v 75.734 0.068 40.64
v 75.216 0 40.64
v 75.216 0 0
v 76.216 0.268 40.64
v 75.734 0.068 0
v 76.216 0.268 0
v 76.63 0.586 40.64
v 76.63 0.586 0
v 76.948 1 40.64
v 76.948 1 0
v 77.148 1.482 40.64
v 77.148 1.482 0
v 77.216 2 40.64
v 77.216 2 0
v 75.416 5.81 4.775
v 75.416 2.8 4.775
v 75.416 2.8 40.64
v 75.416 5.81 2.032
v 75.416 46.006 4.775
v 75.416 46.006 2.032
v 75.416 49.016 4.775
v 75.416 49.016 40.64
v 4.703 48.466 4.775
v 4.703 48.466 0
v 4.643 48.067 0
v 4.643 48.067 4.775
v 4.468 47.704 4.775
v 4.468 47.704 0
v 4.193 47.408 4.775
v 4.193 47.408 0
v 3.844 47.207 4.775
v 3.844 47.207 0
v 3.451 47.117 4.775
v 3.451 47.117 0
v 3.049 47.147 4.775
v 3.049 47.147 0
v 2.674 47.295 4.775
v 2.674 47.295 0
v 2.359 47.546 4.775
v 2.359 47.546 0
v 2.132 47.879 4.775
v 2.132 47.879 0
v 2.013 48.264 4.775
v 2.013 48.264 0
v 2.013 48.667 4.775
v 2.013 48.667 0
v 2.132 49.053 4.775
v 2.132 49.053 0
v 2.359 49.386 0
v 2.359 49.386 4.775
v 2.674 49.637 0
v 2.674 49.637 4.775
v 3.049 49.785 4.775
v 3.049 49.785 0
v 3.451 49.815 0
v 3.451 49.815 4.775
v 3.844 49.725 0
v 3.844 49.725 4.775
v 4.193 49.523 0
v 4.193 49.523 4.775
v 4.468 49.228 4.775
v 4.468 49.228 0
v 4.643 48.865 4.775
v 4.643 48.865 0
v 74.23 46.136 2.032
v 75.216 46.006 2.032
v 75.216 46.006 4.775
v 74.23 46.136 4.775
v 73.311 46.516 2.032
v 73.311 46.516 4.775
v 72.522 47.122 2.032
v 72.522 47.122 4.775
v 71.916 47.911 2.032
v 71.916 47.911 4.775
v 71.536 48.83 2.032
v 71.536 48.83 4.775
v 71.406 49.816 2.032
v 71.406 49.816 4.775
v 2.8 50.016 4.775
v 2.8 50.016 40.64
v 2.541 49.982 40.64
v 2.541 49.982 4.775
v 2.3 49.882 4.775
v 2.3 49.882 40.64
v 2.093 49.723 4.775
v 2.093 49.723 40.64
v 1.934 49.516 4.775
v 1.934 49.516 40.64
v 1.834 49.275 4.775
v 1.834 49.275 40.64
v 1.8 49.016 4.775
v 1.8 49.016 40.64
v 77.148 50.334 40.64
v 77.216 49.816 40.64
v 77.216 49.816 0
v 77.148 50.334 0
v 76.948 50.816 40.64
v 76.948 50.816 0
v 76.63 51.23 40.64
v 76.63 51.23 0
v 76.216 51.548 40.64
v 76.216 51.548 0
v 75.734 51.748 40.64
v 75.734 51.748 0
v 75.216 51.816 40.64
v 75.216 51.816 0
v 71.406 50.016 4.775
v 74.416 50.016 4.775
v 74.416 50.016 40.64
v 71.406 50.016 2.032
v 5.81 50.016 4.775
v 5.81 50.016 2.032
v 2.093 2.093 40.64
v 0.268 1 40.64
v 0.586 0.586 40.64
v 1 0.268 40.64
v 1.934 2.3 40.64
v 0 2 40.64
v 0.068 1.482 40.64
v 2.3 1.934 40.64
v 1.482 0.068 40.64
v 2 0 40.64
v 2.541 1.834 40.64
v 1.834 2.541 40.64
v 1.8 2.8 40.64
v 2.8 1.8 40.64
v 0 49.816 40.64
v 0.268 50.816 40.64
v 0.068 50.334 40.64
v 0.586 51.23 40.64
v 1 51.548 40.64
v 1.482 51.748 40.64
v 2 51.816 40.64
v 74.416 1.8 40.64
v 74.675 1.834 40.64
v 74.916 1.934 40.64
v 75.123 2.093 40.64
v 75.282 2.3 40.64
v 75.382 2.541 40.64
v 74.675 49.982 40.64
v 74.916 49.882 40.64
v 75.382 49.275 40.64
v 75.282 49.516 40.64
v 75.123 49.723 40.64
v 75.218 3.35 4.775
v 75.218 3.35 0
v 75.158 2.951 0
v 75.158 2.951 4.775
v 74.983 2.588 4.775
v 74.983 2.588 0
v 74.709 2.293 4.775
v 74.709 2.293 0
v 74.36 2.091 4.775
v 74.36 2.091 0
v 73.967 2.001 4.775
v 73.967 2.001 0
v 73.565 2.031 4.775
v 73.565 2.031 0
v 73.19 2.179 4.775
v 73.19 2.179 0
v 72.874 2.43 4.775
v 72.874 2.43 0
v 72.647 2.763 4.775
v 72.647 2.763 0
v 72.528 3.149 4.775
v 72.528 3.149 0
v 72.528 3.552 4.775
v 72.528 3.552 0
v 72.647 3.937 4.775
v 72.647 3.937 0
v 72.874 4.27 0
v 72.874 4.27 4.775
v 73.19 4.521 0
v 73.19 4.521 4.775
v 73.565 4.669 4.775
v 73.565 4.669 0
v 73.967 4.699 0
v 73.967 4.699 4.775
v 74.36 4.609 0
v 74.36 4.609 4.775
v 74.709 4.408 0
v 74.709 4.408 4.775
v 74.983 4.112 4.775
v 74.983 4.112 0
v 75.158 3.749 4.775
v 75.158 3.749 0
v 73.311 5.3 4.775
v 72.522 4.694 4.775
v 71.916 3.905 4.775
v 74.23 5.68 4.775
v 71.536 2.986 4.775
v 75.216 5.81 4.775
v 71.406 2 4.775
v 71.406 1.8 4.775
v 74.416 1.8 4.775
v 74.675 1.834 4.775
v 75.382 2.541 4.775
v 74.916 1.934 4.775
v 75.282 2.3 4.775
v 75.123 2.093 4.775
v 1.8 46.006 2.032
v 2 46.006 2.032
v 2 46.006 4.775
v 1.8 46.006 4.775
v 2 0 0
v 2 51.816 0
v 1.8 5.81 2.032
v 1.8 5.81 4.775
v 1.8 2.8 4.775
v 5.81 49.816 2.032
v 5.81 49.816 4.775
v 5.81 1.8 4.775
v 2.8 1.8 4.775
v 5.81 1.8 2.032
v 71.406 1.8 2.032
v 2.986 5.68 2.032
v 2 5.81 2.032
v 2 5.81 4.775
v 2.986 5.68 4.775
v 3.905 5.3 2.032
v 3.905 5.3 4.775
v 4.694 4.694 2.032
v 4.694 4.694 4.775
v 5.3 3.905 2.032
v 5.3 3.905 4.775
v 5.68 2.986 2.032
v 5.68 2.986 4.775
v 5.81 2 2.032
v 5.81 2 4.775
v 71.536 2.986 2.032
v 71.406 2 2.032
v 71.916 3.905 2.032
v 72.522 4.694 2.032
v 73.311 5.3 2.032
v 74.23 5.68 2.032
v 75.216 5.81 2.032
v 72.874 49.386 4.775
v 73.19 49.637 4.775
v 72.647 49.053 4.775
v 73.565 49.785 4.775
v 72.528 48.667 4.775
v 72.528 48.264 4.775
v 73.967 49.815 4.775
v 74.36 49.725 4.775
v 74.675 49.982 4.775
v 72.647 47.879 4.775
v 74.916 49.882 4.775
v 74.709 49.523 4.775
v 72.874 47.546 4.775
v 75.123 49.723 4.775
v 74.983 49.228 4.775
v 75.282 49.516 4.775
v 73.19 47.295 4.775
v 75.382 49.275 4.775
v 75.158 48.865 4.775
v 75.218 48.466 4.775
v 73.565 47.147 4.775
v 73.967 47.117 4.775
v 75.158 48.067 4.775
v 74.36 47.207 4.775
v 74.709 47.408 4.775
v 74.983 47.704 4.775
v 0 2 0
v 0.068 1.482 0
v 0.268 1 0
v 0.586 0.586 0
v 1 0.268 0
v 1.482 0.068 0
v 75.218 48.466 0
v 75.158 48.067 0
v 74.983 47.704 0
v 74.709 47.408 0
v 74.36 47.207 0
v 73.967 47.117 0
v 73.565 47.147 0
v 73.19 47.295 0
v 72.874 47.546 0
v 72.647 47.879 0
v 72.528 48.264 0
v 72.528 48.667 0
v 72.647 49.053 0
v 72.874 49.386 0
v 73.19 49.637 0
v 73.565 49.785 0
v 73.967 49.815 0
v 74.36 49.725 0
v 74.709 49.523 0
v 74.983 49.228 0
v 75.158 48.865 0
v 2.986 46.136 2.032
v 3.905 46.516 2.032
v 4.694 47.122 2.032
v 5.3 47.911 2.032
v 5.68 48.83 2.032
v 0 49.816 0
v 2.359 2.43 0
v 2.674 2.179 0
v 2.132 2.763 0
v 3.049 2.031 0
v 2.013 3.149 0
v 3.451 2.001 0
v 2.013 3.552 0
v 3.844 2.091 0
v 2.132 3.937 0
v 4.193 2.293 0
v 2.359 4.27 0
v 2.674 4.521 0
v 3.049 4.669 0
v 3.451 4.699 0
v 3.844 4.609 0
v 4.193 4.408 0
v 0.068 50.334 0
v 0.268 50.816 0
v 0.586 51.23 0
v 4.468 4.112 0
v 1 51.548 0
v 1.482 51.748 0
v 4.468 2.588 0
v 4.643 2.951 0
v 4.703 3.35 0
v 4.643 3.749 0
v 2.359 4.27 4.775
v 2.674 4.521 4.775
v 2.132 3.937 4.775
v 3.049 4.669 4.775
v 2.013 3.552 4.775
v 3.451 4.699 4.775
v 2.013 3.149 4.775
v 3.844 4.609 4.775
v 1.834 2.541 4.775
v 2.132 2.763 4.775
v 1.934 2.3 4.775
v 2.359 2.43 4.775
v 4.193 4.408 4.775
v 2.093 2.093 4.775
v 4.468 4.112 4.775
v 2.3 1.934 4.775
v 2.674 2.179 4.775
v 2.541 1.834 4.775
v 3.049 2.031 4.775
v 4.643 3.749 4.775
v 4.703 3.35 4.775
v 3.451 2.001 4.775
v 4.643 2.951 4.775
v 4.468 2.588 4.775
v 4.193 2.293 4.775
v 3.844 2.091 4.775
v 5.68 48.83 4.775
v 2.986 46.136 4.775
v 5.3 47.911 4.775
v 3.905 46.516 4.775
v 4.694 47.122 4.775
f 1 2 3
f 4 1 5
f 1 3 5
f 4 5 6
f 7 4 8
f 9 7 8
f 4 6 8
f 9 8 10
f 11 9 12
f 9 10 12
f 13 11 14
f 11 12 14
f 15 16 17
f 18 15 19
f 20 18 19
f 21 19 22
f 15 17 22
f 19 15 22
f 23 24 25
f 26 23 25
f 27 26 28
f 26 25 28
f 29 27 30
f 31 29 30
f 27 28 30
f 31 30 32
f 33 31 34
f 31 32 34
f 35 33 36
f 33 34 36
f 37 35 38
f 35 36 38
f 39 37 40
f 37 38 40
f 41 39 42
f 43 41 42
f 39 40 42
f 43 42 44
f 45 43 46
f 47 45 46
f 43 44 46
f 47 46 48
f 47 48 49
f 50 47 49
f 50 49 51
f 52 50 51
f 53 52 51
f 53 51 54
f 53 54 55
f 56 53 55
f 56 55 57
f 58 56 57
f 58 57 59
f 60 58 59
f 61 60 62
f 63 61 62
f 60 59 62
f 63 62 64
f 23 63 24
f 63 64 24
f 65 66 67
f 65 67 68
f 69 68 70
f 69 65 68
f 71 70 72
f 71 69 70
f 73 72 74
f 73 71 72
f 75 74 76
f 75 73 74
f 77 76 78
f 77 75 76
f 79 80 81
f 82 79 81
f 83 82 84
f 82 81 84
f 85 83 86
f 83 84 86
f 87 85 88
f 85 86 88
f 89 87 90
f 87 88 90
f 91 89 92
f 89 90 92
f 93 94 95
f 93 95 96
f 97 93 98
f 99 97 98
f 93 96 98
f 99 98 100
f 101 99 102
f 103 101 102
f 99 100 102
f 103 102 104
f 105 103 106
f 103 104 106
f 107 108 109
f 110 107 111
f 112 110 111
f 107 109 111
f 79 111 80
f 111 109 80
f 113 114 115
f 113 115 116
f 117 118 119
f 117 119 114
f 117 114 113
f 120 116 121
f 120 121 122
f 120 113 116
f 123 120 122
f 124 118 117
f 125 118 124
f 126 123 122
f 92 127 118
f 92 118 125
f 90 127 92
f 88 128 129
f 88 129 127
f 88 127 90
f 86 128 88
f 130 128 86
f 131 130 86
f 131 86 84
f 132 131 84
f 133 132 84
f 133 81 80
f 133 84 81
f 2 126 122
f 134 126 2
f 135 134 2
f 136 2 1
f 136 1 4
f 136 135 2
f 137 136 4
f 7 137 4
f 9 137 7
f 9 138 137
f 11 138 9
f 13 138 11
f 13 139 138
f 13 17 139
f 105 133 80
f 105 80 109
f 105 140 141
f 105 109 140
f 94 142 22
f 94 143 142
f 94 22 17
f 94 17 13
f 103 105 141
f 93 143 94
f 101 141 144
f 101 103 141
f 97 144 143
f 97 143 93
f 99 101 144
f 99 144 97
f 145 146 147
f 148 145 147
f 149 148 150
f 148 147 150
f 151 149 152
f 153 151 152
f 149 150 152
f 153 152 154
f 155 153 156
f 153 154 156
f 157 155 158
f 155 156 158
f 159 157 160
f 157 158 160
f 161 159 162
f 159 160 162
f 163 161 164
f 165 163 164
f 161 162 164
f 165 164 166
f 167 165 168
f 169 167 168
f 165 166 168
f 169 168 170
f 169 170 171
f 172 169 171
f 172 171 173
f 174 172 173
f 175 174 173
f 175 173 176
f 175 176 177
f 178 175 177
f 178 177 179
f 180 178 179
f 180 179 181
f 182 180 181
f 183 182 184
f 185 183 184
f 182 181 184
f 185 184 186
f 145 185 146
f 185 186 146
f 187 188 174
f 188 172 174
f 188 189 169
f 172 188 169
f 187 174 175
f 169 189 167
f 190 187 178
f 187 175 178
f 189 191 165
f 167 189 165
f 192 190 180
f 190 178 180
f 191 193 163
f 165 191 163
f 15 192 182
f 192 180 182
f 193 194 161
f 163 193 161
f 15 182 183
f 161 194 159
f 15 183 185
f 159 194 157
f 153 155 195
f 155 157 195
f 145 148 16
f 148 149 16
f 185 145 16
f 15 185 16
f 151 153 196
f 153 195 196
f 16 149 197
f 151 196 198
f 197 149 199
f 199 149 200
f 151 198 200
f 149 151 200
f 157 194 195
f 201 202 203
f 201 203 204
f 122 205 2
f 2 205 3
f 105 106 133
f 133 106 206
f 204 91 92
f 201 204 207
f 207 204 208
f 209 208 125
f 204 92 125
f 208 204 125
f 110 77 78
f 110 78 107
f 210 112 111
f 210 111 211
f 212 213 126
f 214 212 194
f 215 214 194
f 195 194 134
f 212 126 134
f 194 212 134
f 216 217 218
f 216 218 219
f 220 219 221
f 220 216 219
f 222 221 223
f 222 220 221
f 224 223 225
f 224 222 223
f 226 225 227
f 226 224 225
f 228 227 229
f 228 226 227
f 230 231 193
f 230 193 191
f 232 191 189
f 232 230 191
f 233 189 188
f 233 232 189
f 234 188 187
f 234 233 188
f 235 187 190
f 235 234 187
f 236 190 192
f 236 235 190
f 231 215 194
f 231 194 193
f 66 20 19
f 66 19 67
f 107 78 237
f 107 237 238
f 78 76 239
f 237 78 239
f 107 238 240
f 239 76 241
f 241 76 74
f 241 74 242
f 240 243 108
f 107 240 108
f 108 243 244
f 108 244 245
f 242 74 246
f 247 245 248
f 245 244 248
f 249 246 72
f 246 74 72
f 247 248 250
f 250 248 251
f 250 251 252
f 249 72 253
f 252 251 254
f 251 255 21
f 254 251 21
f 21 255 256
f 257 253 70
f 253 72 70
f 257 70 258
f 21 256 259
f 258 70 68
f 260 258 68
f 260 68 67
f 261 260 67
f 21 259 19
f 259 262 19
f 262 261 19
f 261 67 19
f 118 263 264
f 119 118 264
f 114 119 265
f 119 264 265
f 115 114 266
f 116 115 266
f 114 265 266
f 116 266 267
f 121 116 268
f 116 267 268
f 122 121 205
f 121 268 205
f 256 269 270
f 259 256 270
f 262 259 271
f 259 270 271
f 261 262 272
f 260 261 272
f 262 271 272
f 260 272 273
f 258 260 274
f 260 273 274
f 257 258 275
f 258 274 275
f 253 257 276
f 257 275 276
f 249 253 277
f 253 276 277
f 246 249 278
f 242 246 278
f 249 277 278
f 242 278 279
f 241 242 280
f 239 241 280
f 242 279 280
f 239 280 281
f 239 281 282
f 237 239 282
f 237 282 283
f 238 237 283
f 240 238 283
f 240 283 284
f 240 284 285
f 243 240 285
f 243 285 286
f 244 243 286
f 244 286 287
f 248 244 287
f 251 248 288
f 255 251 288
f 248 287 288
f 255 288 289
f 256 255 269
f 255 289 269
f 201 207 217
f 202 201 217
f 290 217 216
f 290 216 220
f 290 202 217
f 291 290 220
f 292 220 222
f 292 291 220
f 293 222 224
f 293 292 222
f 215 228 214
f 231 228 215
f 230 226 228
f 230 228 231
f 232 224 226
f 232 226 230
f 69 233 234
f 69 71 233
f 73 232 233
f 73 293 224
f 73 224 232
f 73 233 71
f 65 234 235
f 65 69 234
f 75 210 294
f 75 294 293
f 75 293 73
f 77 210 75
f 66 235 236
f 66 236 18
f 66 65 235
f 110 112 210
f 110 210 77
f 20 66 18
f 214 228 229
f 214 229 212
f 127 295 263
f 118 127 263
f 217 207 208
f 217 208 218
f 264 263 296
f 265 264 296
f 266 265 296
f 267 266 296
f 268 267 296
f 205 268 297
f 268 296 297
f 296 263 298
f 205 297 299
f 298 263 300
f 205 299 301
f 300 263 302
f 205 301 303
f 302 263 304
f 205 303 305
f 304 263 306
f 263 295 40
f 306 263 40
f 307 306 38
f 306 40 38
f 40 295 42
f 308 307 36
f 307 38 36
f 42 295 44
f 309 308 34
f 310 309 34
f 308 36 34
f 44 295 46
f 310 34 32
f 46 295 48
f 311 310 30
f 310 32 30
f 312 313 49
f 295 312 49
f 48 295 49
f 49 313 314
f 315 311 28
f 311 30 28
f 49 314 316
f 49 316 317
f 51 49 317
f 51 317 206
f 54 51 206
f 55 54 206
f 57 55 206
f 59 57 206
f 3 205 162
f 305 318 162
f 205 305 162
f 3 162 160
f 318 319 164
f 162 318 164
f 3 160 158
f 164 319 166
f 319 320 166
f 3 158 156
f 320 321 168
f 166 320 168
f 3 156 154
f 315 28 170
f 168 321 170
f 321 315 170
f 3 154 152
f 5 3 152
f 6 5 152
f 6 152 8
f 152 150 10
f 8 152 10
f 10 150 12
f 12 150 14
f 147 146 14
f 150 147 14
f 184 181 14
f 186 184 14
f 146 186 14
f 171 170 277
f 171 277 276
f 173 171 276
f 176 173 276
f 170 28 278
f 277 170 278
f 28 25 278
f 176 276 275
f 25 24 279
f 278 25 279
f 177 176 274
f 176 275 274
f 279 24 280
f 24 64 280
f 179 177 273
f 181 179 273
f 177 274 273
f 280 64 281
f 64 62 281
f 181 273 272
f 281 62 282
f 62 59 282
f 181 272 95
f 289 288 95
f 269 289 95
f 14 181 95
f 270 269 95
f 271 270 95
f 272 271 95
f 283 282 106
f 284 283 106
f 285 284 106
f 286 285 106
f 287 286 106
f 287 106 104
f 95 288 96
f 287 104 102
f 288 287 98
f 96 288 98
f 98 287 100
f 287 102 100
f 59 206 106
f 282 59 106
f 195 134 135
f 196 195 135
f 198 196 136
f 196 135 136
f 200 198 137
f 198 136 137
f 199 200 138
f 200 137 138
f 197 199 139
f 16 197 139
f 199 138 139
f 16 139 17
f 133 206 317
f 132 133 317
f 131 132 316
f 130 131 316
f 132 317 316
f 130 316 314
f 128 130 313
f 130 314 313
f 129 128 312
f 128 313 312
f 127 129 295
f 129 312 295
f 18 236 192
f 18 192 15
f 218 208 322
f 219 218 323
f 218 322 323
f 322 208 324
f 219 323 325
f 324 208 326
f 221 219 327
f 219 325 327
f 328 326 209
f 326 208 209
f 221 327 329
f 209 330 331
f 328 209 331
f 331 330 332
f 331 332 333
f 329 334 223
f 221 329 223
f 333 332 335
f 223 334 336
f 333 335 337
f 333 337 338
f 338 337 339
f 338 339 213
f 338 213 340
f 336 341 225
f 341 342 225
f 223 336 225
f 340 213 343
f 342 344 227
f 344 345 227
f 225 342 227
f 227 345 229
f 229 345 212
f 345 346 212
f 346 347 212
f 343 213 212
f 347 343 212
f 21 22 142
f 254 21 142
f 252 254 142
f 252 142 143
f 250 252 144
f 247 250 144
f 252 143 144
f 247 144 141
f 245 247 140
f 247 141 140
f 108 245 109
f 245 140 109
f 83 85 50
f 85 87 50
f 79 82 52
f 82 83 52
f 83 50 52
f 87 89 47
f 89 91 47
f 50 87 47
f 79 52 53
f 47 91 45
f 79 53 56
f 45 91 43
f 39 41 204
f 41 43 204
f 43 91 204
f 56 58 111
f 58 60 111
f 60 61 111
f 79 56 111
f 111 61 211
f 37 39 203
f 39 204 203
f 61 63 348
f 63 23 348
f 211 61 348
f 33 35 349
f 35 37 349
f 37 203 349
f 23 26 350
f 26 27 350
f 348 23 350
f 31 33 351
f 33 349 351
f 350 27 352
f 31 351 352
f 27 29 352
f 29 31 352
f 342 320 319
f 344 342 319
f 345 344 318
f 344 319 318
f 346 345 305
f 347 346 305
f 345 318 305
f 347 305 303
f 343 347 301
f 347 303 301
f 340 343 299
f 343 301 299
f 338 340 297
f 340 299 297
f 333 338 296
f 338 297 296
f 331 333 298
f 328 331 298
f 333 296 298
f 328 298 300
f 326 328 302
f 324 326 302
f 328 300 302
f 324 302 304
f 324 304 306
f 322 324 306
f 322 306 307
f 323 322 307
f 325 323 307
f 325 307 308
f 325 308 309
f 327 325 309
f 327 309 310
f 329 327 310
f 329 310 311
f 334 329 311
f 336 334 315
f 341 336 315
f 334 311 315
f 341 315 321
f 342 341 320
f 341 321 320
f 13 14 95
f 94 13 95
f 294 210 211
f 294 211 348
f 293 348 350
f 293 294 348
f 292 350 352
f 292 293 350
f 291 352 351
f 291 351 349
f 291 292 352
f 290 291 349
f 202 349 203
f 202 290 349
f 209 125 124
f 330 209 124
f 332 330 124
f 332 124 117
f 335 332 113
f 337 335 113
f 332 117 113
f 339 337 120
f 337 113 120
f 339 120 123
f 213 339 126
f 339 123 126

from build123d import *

# Parameters (mm, degrees)
F1_DEPTH = 40.64
F3_DEPTH = 38.608
F5_DEPTH = 4.7752
F6_R     = 1.35255
F7_DEPTH = 4.7752


# Not quite as in the source:
# - a feature names something its author has since deleted; it is built from what else it names


with BuildPart() as f1:
    # F0 (on Top) → F1 (new body)
    with BuildSketch(Plane.XY):
        with BuildLine():
            ThreePointArc((0, 2), (0.5857864376, 0.5857864376), (2, 0))
            Line((2, 0), (75.216, 0))
            ThreePointArc((75.216, 0), (76.6302135624, 0.5857864376), (77.216, 2))
            Line((77.216, 2), (77.216, 49.816))
            ThreePointArc((77.216, 49.816), (76.6302135624, 51.2302135624), (75.216, 51.816))
            Line((75.216, 51.816), (2, 51.816))
            ThreePointArc((2, 51.816), (0.5857864376, 51.2302135624), (0, 49.816))
            Line((0, 49.816), (0, 2))
        make_face()
    extrude(amount=F1_DEPTH)

    # F2 (on face) → F3 (cut)
    with BuildSketch(Plane.XY.offset(40.64)):
        with BuildLine():
            Line((74.416, 50.016), (2.8, 50.016))
            ThreePointArc((2.8, 50.016), (2.0928932188, 49.7231067812), (1.8, 49.016))
            Line((1.8, 49.016), (1.8, 2.8))
            ThreePointArc((1.8, 2.8), (2.0928932188, 2.0928932188), (2.8, 1.8))
            Line((2.8, 1.8), (74.416, 1.8))
            ThreePointArc((74.416, 1.8), (75.1231067812, 2.0928932188), (75.416, 2.8))
            Line((75.416, 2.8), (75.416, 49.016))
            ThreePointArc((75.416, 49.016), (75.1231067812, 49.7231067812), (74.416, 50.016))
        make_face()
    extrude(amount=-F3_DEPTH, mode=Mode.SUBTRACT)

    # F4 (on face) → F5 (join)
    with BuildSketch(Plane(origin=(0, 0, 0), x_dir=(1, 0, 0), z_dir=(0, 0, -1))):
        with BuildLine():
            ThreePointArc((77.216, -2), (76.6302135624, -0.5857864376), (75.216, 0))
            Line((75.216, 0), (71.406, 0))
            Line((71.406, 0), (71.406, -2))
            ThreePointArc((71.406, -2), (72.5219231637, -4.6940768363), (75.216, -5.81))
            Line((75.216, -5.81), (77.216, -5.81))
            Line((77.216, -5.81), (77.216, -2))
        make_face()
        with BuildLine():
            Line((71.406, -49.816), (71.406, -51.816))
            Line((71.406, -51.816), (75.216, -51.816))
            ThreePointArc((75.216, -51.816), (76.6302135624, -51.2302135624), (77.216, -49.816))
            Line((77.216, -49.816), (77.216, -46.006))
            Line((77.216, -46.006), (75.216, -46.006))
            ThreePointArc((75.216, -46.006), (72.5219231637, -47.1219231637), (71.406, -49.816))
        make_face()
        with BuildLine():
            ThreePointArc((5.81, -49.816), (4.6940768363, -47.1219231637), (2, -46.006))
            Line((2, -46.006), (0, -46.006))
            Line((0, -46.006), (0, -49.816))
            ThreePointArc((0, -49.816), (0.5857864376, -51.2302135624), (2, -51.816))
            Line((2, -51.816), (5.81, -51.816))
            Line((5.81, -51.816), (5.81, -49.816))
        make_face()
        with BuildLine():
            Line((5.81, 0), (2, 0))
            ThreePointArc((2, 0), (0.5857864376, -0.5857864376), (0, -2))
            Line((0, -2), (0, -5.81))
            Line((0, -5.81), (2, -5.81))
            ThreePointArc((2, -5.81), (4.6940768363, -4.6940768363), (5.81, -2))
            Line((5.81, -2), (5.81, 0))
        make_face()
    extrude(amount=-F5_DEPTH)

    # F6 (on face) → F7 (cut, through all)
    with BuildSketch(Plane(origin=(0, 0, 0), x_dir=(1, 0, 0), z_dir=(0, 0, -1))):
        with Locations((73.8658709242, -3.3501290758)):
            Circle(F6_R)
        with Locations((3.3501290758, -3.3501290758)):
            Circle(F6_R)
        with Locations((3.3501290758, -48.4658709242)):
            Circle(F6_R)
        with Locations((73.8658709242, -48.4658709242)):
            Circle(F6_R)
    extrude(amount=-F7_DEPTH, mode=Mode.SUBTRACT)


solid = f1.part
